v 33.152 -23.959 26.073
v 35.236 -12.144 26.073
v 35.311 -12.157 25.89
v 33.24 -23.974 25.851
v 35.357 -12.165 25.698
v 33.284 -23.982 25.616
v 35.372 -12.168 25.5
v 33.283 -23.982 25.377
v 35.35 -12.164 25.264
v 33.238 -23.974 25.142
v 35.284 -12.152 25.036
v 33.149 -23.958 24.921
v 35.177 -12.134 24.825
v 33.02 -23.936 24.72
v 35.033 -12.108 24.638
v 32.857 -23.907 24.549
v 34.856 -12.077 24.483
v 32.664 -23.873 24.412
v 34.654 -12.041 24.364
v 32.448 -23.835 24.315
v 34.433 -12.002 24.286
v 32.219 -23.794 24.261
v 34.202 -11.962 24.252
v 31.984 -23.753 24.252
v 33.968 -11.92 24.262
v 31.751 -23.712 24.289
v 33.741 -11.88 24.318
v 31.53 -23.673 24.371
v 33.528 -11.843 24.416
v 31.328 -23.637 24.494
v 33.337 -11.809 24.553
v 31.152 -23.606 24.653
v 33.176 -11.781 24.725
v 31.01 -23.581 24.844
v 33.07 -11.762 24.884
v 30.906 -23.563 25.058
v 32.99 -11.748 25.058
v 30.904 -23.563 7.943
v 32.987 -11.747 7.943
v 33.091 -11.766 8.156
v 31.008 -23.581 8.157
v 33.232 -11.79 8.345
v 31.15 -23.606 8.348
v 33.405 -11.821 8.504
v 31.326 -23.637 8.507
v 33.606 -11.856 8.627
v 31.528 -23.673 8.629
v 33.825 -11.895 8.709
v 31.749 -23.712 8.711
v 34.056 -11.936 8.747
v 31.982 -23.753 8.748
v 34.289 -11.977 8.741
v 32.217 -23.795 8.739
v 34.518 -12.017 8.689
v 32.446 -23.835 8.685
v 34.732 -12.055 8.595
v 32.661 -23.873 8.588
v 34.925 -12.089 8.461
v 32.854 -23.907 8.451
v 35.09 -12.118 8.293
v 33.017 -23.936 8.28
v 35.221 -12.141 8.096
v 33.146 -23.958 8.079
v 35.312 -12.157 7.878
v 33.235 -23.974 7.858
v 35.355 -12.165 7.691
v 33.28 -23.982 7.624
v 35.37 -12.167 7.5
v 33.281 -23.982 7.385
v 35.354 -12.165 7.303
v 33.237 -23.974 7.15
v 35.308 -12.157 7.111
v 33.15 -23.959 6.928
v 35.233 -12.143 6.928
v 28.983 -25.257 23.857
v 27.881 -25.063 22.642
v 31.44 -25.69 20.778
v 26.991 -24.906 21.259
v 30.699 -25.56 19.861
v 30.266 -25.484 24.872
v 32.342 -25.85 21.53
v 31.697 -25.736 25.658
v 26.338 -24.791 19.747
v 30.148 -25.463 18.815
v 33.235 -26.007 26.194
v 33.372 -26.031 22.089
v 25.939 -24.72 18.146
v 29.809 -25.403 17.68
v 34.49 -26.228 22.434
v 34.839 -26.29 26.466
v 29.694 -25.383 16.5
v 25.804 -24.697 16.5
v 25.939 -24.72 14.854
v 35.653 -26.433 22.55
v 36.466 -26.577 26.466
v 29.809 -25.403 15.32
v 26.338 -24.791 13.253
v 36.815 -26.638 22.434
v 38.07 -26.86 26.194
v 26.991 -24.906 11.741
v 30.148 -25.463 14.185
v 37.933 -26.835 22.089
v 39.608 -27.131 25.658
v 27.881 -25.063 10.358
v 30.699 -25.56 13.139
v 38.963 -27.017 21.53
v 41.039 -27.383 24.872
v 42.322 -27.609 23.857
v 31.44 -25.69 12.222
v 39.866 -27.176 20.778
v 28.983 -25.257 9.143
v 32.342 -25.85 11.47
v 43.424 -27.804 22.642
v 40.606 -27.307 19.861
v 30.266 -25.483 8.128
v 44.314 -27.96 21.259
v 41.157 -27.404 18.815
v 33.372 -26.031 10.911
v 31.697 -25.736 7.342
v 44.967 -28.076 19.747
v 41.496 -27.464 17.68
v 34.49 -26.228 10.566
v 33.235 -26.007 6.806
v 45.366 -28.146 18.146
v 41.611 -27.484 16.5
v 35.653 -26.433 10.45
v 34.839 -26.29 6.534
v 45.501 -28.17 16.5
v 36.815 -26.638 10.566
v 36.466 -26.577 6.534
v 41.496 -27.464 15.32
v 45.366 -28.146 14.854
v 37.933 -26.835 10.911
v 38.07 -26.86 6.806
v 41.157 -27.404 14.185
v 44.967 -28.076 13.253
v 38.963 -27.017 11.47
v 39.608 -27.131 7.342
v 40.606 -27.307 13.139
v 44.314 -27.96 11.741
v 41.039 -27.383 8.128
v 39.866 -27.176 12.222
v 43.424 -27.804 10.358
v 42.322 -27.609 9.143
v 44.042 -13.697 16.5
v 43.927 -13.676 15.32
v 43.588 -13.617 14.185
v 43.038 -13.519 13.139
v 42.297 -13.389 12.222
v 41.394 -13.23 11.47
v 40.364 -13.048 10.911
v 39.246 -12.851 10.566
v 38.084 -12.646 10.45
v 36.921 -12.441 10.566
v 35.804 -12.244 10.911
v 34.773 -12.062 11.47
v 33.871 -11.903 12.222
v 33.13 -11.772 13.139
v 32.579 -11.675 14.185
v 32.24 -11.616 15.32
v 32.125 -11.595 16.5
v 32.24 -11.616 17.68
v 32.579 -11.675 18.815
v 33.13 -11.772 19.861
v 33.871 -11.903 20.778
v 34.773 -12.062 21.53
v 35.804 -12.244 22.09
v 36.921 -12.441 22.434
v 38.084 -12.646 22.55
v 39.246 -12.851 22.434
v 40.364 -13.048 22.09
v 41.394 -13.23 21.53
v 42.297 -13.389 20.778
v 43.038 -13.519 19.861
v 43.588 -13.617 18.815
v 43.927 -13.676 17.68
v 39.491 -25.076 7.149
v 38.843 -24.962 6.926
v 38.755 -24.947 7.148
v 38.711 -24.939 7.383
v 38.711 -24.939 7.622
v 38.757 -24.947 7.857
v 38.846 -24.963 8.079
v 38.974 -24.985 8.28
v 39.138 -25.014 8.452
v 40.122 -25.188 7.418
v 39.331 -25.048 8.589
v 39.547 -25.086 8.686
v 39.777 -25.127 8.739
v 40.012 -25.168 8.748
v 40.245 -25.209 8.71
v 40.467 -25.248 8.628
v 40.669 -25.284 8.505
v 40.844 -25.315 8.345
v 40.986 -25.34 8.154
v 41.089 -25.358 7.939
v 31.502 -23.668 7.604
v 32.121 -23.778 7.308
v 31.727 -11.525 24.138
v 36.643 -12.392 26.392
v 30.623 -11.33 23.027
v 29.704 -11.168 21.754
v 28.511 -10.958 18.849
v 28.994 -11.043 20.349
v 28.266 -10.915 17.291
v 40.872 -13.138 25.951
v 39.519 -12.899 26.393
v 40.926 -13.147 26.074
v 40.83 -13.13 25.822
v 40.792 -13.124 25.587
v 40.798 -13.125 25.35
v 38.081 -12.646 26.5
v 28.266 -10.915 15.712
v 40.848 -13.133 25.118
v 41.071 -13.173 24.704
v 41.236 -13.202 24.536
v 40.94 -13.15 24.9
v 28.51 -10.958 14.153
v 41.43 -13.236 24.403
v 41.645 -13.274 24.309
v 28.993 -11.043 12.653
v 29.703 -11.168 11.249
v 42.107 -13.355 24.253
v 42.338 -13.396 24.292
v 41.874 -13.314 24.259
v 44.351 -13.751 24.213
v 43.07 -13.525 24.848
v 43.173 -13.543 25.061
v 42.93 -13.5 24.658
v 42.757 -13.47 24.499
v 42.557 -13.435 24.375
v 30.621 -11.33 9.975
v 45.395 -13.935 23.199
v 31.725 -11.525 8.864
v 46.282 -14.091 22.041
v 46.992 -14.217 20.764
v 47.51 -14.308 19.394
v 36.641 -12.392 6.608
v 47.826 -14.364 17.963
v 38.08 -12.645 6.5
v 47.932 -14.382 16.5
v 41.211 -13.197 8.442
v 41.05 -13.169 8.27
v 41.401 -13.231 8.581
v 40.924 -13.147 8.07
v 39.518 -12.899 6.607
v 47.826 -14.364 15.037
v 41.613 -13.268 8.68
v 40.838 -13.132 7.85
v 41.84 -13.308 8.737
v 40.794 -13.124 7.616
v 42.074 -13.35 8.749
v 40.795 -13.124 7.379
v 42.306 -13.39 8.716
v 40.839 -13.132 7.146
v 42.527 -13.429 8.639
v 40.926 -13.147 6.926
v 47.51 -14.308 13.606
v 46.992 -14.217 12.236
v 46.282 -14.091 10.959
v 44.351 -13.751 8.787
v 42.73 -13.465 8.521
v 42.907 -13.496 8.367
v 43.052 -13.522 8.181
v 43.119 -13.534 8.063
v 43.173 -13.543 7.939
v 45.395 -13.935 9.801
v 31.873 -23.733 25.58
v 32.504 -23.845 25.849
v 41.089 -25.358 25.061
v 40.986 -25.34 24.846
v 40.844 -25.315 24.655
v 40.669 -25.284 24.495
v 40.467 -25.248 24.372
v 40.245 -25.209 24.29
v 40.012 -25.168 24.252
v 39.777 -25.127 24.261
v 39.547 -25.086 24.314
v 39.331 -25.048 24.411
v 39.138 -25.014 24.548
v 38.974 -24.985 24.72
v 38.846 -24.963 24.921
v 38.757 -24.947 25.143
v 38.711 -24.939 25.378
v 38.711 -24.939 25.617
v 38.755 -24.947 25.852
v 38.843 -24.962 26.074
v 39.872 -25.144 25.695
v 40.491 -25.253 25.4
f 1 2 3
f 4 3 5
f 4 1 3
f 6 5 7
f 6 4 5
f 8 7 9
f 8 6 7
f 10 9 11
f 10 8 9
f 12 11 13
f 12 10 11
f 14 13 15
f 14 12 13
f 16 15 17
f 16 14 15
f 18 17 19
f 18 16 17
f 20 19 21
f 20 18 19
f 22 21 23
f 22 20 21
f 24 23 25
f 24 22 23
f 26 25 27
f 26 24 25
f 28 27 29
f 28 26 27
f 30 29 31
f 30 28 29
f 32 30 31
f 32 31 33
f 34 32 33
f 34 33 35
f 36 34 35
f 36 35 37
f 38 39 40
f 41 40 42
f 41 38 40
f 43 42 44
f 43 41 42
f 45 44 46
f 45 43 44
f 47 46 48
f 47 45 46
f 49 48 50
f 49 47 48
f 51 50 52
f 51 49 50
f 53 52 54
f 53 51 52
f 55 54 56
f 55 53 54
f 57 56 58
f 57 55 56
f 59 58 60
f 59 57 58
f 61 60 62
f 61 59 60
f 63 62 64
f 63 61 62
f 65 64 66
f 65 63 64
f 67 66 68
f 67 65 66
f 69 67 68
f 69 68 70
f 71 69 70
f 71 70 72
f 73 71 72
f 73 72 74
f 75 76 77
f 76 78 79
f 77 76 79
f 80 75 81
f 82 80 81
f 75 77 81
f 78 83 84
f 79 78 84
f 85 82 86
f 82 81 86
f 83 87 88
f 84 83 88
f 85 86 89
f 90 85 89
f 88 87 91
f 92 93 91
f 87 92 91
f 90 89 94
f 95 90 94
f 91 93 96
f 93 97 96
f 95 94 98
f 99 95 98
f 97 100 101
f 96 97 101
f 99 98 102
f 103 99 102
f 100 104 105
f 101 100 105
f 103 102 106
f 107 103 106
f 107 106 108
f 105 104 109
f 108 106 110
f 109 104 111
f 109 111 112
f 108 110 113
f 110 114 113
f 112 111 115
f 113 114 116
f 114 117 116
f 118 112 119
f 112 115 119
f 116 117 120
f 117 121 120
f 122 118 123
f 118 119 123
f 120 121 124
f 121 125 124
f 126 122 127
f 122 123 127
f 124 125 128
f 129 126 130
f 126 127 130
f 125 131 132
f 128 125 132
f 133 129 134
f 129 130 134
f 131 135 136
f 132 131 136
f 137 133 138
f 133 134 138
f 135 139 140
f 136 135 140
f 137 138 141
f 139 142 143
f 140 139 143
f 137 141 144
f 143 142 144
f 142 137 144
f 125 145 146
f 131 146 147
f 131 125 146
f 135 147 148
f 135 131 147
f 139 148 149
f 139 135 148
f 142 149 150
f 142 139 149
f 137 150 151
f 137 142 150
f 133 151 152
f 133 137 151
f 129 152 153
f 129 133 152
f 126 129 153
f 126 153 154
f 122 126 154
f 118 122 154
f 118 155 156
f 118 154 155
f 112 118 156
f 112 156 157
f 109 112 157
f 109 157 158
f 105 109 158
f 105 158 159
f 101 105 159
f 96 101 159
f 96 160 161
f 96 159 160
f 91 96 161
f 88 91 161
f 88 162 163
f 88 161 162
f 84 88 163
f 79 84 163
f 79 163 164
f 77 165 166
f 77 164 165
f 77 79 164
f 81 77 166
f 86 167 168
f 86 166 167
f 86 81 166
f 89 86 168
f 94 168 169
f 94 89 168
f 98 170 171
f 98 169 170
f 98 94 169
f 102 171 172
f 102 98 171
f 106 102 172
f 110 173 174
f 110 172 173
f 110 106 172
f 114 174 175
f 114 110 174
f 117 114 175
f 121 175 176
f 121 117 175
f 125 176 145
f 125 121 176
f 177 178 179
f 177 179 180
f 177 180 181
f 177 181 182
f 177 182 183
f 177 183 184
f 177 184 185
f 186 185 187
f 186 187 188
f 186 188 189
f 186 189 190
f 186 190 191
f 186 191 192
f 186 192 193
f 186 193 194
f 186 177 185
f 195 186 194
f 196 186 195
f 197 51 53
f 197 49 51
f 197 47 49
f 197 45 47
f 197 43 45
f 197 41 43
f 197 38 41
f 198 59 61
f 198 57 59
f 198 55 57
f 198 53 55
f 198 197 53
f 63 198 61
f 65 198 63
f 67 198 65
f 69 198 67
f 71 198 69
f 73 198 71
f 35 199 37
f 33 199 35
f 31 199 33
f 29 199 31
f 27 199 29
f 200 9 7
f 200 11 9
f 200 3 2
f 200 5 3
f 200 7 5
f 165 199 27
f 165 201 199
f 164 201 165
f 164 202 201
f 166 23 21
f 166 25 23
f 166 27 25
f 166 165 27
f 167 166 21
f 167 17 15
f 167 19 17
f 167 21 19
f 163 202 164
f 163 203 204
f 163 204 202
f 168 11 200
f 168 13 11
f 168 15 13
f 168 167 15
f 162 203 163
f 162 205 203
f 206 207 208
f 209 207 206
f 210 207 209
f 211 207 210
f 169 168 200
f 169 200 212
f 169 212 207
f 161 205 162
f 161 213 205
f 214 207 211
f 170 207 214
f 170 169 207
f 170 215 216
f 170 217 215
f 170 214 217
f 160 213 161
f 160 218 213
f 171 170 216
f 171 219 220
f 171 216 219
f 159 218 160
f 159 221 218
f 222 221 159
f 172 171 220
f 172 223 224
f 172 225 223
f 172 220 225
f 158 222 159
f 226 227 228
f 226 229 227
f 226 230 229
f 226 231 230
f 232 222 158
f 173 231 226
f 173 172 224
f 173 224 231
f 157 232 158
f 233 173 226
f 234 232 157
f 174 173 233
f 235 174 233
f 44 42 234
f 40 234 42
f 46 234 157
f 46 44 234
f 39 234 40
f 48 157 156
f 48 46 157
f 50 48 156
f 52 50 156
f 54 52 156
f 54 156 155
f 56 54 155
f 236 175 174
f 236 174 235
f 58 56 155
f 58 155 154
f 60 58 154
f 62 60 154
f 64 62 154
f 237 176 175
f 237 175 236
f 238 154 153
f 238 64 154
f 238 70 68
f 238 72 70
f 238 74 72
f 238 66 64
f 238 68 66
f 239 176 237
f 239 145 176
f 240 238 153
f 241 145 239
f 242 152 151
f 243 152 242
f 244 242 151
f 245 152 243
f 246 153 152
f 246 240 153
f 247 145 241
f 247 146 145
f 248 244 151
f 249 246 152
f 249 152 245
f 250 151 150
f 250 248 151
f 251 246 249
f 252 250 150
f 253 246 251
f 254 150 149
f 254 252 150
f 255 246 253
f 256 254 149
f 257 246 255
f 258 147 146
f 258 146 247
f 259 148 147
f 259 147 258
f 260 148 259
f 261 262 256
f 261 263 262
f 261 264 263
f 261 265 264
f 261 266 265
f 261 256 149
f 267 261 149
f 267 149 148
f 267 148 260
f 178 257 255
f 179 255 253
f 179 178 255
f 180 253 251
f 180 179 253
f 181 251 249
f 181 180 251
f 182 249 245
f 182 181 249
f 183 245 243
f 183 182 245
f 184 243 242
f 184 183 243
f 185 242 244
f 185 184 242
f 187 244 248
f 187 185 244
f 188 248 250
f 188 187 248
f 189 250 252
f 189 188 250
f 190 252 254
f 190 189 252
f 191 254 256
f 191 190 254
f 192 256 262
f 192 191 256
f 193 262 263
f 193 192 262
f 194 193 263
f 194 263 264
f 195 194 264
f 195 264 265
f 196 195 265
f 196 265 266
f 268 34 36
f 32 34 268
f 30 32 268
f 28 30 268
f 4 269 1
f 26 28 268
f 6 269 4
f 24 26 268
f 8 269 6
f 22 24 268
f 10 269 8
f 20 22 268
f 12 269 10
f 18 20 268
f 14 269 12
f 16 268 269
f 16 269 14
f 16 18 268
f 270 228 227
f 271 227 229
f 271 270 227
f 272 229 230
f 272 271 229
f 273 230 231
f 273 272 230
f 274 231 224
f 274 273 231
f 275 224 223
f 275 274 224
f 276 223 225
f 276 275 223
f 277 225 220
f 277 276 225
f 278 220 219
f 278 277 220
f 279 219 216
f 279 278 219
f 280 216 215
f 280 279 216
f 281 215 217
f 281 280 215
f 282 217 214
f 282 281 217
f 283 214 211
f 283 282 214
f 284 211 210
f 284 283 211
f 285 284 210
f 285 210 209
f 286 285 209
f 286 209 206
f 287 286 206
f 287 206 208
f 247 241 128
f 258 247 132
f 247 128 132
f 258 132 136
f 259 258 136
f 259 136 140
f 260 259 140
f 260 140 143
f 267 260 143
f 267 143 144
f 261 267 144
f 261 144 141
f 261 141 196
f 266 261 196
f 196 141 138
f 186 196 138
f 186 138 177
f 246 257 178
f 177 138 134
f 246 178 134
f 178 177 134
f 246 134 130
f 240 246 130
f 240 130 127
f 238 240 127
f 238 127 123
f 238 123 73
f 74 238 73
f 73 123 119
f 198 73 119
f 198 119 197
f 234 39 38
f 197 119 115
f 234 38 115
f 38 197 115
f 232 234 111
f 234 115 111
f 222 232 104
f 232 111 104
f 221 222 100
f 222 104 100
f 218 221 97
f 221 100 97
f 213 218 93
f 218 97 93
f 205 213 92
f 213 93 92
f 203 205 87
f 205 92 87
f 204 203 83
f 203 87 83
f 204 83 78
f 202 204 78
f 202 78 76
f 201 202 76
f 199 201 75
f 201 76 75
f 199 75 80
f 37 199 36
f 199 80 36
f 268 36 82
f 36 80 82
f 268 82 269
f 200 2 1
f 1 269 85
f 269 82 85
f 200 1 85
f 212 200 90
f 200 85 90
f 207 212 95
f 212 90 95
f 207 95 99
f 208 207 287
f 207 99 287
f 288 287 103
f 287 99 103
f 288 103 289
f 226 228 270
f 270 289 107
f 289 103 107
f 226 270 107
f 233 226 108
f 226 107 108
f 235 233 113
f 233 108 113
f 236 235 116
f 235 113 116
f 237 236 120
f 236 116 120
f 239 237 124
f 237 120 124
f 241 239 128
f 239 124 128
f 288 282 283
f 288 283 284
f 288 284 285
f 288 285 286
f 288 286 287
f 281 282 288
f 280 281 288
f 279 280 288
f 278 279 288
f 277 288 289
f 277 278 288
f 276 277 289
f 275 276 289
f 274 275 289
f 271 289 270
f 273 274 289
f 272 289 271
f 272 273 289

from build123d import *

# Parameters (mm, degrees)
CYLINDER034_R               = 1.25
CYLINDER034_DEPTH           = 14
CYLINDER034_ROLL_ANGLE      = -89.999776
CYLINDER034_PITCH_ANGLE     = 1.4e-05
CYLINDER034_PLACEMENT_ANGLE = -9.999925
CYLINDER033_R               = 1.25
CYLINDER033_DEPTH           = 14
CYLINDER033_ROLL_ANGLE      = -89.999776
CYLINDER033_PITCH_ANGLE     = 1.4e-05
CYLINDER033_PLACEMENT_ANGLE = -9.999925
CYLINDER032_R               = 1.25
CYLINDER032_DEPTH           = 14
CYLINDER032_ROLL_ANGLE      = -89.999776
CYLINDER032_PITCH_ANGLE     = 1.4e-05
CYLINDER032_PLACEMENT_ANGLE = -9.999925
CYLINDER031_R               = 1.25
CYLINDER031_DEPTH           = 14
CYLINDER031_ROLL_ANGLE      = -89.999776
CYLINDER031_PITCH_ANGLE     = 1.4e-05
CYLINDER031_PLACEMENT_ANGLE = -9.999925
CYLINDER025_R               = 6.05
CYLINDER025_DEPTH           = 18
CYLINDER025_ROLL_ANGLE      = -89.999807
CYLINDER025_PITCH_ANGLE     = 8e-06
CYLINDER025_PLACEMENT_ANGLE = -9.999933
CYLINDER024_R               = 4.75
CYLINDER024_DEPTH           = 9
CYLINDER024_ROLL_ANGLE      = -89.999776
CYLINDER024_PITCH_ANGLE     = 1.4e-05
CYLINDER024_PLACEMENT_ANGLE = -9.999925
CYLINDER023_R               = 10
CYLINDER023_DEPTH           = 14
CYLINDER023_ROLL_ANGLE      = -89.999807
CYLINDER023_PITCH_ANGLE     = 8e-06
CYLINDER023_PLACEMENT_ANGLE = -9.999933


with BuildPart() as cylinder034:
    # Cylinder034 → Cylinder034 (new body)
    with BuildSketch(Plane.XY):
        Circle(CYLINDER034_R)
    extrude(amount=CYLINDER034_DEPTH)


with BuildPart() as cylinder034_1:
    # Cylinder034 roll: moved
    add(cylinder034.part.rotate(Axis((0, 0, 0), (1, 0, 0)), CYLINDER034_ROLL_ANGLE))


with BuildPart() as cylinder034_2:
    # Cylinder034 pitch: moved
    add(cylinder034_1.part.rotate(Axis((0, 0, 0), (0, 1, 0)), CYLINDER034_PITCH_ANGLE))


with BuildPart() as cylinder034_3:
    # Cylinder034 placement: moved
    add(cylinder034_2.part.moved(Location((39.936529, -25.15494, 7.500007))).rotate(Axis((39.936529, -25.15494, 7.500007), (0, 0, 1)), CYLINDER034_PLACEMENT_ANGLE))


with BuildPart() as cylinder033:
    # Cylinder033 → Cylinder033 (new body)
    with BuildSketch(Plane.XY):
        Circle(CYLINDER033_R)
    extrude(amount=CYLINDER033_DEPTH)


with BuildPart() as cylinder033_1:
    # Cylinder033 roll: moved
    add(cylinder033.part.rotate(Axis((0, 0, 0), (1, 0, 0)), CYLINDER033_ROLL_ANGLE))


with BuildPart() as cylinder033_2:
    # Cylinder033 pitch: moved
    add(cylinder033_1.part.rotate(Axis((0, 0, 0), (0, 1, 0)), CYLINDER033_PITCH_ANGLE))


with BuildPart() as cylinder033_3:
    # Cylinder033 placement: moved
    add(cylinder033_2.part.moved(Location((39.936521, -25.15501, 25.500007))).rotate(Axis((39.936521, -25.15501, 25.500007), (0, 0, 1)), CYLINDER033_PLACEMENT_ANGLE))


with BuildPart() as cylinder032:
    # Cylinder032 → Cylinder032 (new body)
    with BuildSketch(Plane.XY):
        Circle(CYLINDER032_R)
    extrude(amount=CYLINDER032_DEPTH)


with BuildPart() as cylinder032_1:
    # Cylinder032 roll: moved
    add(cylinder032.part.rotate(Axis((0, 0, 0), (1, 0, 0)), CYLINDER032_ROLL_ANGLE))


with BuildPart() as cylinder032_2:
    # Cylinder032 pitch: moved
    add(cylinder032_1.part.rotate(Axis((0, 0, 0), (0, 1, 0)), CYLINDER032_PITCH_ANGLE))


with BuildPart() as cylinder032_3:
    # Cylinder032 placement: moved
    add(cylinder032_2.part.moved(Location((32.058057, -23.765835, 25.500009))).rotate(Axis((32.058057, -23.765835, 25.500009), (0, 0, 1)), CYLINDER032_PLACEMENT_ANGLE))


with BuildPart() as cylinder031:
    # Cylinder031 → Cylinder031 (new body)
    with BuildSketch(Plane.XY):
        Circle(CYLINDER031_R)
    extrude(amount=CYLINDER031_DEPTH)


with BuildPart() as cylinder031_1:
    # Cylinder031 roll: moved
    add(cylinder031.part.rotate(Axis((0, 0, 0), (1, 0, 0)), CYLINDER031_ROLL_ANGLE))


with BuildPart() as cylinder031_2:
    # Cylinder031 pitch: moved
    add(cylinder031_1.part.rotate(Axis((0, 0, 0), (0, 1, 0)), CYLINDER031_PITCH_ANGLE))


with BuildPart() as cylinder031_3:
    # Cylinder031 placement: moved
    add(cylinder031_2.part.moved(Location((32.055183, -23.766017, 7.500006))).rotate(Axis((32.055183, -23.766017, 7.500006), (0, 0, 1)), CYLINDER031_PLACEMENT_ANGLE))


with BuildPart() as bohrung_lager:
    # Cylinder025 → Cylinder025 (new body)
    with BuildSketch(Plane.XY):
        Circle(CYLINDER025_R)
    extrude(amount=CYLINDER025_DEPTH)


with BuildPart() as bohrung_lager_1:
    # Cylinder025 roll: moved
    add(bohrung_lager.part.rotate(Axis((0, 0, 0), (1, 0, 0)), CYLINDER025_ROLL_ANGLE))


with BuildPart() as bohrung_lager_2:
    # Cylinder025 pitch: moved
    add(bohrung_lager_1.part.rotate(Axis((0, 0, 0), (0, 1, 0)), CYLINDER025_PITCH_ANGLE))


with BuildPart() as bohrung_lager_3:
    # Cylinder025 placement: moved
    add(bohrung_lager_2.part.moved(Location((35.652514, -26.433263, 16.499993))).rotate(Axis((35.652514, -26.433263, 16.499993), (0, 0, 1)), CYLINDER025_PLACEMENT_ANGLE))


with BuildPart() as cylinder024:
    # Cylinder024 → Cylinder024 (new body)
    with BuildSketch(Plane.XY):
        Circle(CYLINDER024_R)
    extrude(amount=CYLINDER024_DEPTH)


with BuildPart() as cylinder024_1:
    # Cylinder024 roll: moved
    add(cylinder024.part.rotate(Axis((0, 0, 0), (1, 0, 0)), CYLINDER024_ROLL_ANGLE))


with BuildPart() as cylinder024_2:
    # Cylinder024 pitch: moved
    add(cylinder024_1.part.rotate(Axis((0, 0, 0), (0, 1, 0)), CYLINDER024_PITCH_ANGLE))


with BuildPart() as cylinder024_3:
    # Cylinder024 placement: moved
    add(cylinder024_2.part.moved(Location((33.913531, -36.27808, 15.499961))).rotate(Axis((33.913531, -36.27808, 15.499961), (0, 0, 1)), CYLINDER024_PLACEMENT_ANGLE))


with BuildPart() as cut031:
    # Cylinder023 → Cylinder023 (new body)
    with BuildSketch(Plane.XY):
        Circle(CYLINDER023_R)
    extrude(amount=CYLINDER023_DEPTH)


with BuildPart() as cut031_1:
    # Cylinder023 roll: moved
    add(cut031.part.rotate(Axis((0, 0, 0), (1, 0, 0)), CYLINDER023_ROLL_ANGLE))


with BuildPart() as cut031_2:
    # Cylinder023 pitch: moved
    add(cut031_1.part.rotate(Axis((0, 0, 0), (0, 1, 0)), CYLINDER023_PITCH_ANGLE))


with BuildPart() as cut031_3:
    # Cylinder023 placement: moved
    add(cut031_2.part.moved(Location((35.652514, -26.433263, 16.499993))).rotate(Axis((35.652514, -26.433263, 16.499993), (0, 0, 1)), CYLINDER023_PLACEMENT_ANGLE))

    # Cut022: cut Cylinder024
    add(cylinder024_3.part, mode=Mode.SUBTRACT)

    # Cut023: cut bohrung_lager
    add(bohrung_lager_3.part, mode=Mode.SUBTRACT)

    # Cut028: cut Cylinder031
    add(cylinder031_3.part, mode=Mode.SUBTRACT)

    # Cut029: cut Cylinder032
    add(cylinder032_3.part, mode=Mode.SUBTRACT)

    # Cut030: cut Cylinder033
    add(cylinder033_3.part, mode=Mode.SUBTRACT)

    # Cut031: cut Cylinder034
    add(cylinder034_3.part, mode=Mode.SUBTRACT)


solid = cut031_3.part
